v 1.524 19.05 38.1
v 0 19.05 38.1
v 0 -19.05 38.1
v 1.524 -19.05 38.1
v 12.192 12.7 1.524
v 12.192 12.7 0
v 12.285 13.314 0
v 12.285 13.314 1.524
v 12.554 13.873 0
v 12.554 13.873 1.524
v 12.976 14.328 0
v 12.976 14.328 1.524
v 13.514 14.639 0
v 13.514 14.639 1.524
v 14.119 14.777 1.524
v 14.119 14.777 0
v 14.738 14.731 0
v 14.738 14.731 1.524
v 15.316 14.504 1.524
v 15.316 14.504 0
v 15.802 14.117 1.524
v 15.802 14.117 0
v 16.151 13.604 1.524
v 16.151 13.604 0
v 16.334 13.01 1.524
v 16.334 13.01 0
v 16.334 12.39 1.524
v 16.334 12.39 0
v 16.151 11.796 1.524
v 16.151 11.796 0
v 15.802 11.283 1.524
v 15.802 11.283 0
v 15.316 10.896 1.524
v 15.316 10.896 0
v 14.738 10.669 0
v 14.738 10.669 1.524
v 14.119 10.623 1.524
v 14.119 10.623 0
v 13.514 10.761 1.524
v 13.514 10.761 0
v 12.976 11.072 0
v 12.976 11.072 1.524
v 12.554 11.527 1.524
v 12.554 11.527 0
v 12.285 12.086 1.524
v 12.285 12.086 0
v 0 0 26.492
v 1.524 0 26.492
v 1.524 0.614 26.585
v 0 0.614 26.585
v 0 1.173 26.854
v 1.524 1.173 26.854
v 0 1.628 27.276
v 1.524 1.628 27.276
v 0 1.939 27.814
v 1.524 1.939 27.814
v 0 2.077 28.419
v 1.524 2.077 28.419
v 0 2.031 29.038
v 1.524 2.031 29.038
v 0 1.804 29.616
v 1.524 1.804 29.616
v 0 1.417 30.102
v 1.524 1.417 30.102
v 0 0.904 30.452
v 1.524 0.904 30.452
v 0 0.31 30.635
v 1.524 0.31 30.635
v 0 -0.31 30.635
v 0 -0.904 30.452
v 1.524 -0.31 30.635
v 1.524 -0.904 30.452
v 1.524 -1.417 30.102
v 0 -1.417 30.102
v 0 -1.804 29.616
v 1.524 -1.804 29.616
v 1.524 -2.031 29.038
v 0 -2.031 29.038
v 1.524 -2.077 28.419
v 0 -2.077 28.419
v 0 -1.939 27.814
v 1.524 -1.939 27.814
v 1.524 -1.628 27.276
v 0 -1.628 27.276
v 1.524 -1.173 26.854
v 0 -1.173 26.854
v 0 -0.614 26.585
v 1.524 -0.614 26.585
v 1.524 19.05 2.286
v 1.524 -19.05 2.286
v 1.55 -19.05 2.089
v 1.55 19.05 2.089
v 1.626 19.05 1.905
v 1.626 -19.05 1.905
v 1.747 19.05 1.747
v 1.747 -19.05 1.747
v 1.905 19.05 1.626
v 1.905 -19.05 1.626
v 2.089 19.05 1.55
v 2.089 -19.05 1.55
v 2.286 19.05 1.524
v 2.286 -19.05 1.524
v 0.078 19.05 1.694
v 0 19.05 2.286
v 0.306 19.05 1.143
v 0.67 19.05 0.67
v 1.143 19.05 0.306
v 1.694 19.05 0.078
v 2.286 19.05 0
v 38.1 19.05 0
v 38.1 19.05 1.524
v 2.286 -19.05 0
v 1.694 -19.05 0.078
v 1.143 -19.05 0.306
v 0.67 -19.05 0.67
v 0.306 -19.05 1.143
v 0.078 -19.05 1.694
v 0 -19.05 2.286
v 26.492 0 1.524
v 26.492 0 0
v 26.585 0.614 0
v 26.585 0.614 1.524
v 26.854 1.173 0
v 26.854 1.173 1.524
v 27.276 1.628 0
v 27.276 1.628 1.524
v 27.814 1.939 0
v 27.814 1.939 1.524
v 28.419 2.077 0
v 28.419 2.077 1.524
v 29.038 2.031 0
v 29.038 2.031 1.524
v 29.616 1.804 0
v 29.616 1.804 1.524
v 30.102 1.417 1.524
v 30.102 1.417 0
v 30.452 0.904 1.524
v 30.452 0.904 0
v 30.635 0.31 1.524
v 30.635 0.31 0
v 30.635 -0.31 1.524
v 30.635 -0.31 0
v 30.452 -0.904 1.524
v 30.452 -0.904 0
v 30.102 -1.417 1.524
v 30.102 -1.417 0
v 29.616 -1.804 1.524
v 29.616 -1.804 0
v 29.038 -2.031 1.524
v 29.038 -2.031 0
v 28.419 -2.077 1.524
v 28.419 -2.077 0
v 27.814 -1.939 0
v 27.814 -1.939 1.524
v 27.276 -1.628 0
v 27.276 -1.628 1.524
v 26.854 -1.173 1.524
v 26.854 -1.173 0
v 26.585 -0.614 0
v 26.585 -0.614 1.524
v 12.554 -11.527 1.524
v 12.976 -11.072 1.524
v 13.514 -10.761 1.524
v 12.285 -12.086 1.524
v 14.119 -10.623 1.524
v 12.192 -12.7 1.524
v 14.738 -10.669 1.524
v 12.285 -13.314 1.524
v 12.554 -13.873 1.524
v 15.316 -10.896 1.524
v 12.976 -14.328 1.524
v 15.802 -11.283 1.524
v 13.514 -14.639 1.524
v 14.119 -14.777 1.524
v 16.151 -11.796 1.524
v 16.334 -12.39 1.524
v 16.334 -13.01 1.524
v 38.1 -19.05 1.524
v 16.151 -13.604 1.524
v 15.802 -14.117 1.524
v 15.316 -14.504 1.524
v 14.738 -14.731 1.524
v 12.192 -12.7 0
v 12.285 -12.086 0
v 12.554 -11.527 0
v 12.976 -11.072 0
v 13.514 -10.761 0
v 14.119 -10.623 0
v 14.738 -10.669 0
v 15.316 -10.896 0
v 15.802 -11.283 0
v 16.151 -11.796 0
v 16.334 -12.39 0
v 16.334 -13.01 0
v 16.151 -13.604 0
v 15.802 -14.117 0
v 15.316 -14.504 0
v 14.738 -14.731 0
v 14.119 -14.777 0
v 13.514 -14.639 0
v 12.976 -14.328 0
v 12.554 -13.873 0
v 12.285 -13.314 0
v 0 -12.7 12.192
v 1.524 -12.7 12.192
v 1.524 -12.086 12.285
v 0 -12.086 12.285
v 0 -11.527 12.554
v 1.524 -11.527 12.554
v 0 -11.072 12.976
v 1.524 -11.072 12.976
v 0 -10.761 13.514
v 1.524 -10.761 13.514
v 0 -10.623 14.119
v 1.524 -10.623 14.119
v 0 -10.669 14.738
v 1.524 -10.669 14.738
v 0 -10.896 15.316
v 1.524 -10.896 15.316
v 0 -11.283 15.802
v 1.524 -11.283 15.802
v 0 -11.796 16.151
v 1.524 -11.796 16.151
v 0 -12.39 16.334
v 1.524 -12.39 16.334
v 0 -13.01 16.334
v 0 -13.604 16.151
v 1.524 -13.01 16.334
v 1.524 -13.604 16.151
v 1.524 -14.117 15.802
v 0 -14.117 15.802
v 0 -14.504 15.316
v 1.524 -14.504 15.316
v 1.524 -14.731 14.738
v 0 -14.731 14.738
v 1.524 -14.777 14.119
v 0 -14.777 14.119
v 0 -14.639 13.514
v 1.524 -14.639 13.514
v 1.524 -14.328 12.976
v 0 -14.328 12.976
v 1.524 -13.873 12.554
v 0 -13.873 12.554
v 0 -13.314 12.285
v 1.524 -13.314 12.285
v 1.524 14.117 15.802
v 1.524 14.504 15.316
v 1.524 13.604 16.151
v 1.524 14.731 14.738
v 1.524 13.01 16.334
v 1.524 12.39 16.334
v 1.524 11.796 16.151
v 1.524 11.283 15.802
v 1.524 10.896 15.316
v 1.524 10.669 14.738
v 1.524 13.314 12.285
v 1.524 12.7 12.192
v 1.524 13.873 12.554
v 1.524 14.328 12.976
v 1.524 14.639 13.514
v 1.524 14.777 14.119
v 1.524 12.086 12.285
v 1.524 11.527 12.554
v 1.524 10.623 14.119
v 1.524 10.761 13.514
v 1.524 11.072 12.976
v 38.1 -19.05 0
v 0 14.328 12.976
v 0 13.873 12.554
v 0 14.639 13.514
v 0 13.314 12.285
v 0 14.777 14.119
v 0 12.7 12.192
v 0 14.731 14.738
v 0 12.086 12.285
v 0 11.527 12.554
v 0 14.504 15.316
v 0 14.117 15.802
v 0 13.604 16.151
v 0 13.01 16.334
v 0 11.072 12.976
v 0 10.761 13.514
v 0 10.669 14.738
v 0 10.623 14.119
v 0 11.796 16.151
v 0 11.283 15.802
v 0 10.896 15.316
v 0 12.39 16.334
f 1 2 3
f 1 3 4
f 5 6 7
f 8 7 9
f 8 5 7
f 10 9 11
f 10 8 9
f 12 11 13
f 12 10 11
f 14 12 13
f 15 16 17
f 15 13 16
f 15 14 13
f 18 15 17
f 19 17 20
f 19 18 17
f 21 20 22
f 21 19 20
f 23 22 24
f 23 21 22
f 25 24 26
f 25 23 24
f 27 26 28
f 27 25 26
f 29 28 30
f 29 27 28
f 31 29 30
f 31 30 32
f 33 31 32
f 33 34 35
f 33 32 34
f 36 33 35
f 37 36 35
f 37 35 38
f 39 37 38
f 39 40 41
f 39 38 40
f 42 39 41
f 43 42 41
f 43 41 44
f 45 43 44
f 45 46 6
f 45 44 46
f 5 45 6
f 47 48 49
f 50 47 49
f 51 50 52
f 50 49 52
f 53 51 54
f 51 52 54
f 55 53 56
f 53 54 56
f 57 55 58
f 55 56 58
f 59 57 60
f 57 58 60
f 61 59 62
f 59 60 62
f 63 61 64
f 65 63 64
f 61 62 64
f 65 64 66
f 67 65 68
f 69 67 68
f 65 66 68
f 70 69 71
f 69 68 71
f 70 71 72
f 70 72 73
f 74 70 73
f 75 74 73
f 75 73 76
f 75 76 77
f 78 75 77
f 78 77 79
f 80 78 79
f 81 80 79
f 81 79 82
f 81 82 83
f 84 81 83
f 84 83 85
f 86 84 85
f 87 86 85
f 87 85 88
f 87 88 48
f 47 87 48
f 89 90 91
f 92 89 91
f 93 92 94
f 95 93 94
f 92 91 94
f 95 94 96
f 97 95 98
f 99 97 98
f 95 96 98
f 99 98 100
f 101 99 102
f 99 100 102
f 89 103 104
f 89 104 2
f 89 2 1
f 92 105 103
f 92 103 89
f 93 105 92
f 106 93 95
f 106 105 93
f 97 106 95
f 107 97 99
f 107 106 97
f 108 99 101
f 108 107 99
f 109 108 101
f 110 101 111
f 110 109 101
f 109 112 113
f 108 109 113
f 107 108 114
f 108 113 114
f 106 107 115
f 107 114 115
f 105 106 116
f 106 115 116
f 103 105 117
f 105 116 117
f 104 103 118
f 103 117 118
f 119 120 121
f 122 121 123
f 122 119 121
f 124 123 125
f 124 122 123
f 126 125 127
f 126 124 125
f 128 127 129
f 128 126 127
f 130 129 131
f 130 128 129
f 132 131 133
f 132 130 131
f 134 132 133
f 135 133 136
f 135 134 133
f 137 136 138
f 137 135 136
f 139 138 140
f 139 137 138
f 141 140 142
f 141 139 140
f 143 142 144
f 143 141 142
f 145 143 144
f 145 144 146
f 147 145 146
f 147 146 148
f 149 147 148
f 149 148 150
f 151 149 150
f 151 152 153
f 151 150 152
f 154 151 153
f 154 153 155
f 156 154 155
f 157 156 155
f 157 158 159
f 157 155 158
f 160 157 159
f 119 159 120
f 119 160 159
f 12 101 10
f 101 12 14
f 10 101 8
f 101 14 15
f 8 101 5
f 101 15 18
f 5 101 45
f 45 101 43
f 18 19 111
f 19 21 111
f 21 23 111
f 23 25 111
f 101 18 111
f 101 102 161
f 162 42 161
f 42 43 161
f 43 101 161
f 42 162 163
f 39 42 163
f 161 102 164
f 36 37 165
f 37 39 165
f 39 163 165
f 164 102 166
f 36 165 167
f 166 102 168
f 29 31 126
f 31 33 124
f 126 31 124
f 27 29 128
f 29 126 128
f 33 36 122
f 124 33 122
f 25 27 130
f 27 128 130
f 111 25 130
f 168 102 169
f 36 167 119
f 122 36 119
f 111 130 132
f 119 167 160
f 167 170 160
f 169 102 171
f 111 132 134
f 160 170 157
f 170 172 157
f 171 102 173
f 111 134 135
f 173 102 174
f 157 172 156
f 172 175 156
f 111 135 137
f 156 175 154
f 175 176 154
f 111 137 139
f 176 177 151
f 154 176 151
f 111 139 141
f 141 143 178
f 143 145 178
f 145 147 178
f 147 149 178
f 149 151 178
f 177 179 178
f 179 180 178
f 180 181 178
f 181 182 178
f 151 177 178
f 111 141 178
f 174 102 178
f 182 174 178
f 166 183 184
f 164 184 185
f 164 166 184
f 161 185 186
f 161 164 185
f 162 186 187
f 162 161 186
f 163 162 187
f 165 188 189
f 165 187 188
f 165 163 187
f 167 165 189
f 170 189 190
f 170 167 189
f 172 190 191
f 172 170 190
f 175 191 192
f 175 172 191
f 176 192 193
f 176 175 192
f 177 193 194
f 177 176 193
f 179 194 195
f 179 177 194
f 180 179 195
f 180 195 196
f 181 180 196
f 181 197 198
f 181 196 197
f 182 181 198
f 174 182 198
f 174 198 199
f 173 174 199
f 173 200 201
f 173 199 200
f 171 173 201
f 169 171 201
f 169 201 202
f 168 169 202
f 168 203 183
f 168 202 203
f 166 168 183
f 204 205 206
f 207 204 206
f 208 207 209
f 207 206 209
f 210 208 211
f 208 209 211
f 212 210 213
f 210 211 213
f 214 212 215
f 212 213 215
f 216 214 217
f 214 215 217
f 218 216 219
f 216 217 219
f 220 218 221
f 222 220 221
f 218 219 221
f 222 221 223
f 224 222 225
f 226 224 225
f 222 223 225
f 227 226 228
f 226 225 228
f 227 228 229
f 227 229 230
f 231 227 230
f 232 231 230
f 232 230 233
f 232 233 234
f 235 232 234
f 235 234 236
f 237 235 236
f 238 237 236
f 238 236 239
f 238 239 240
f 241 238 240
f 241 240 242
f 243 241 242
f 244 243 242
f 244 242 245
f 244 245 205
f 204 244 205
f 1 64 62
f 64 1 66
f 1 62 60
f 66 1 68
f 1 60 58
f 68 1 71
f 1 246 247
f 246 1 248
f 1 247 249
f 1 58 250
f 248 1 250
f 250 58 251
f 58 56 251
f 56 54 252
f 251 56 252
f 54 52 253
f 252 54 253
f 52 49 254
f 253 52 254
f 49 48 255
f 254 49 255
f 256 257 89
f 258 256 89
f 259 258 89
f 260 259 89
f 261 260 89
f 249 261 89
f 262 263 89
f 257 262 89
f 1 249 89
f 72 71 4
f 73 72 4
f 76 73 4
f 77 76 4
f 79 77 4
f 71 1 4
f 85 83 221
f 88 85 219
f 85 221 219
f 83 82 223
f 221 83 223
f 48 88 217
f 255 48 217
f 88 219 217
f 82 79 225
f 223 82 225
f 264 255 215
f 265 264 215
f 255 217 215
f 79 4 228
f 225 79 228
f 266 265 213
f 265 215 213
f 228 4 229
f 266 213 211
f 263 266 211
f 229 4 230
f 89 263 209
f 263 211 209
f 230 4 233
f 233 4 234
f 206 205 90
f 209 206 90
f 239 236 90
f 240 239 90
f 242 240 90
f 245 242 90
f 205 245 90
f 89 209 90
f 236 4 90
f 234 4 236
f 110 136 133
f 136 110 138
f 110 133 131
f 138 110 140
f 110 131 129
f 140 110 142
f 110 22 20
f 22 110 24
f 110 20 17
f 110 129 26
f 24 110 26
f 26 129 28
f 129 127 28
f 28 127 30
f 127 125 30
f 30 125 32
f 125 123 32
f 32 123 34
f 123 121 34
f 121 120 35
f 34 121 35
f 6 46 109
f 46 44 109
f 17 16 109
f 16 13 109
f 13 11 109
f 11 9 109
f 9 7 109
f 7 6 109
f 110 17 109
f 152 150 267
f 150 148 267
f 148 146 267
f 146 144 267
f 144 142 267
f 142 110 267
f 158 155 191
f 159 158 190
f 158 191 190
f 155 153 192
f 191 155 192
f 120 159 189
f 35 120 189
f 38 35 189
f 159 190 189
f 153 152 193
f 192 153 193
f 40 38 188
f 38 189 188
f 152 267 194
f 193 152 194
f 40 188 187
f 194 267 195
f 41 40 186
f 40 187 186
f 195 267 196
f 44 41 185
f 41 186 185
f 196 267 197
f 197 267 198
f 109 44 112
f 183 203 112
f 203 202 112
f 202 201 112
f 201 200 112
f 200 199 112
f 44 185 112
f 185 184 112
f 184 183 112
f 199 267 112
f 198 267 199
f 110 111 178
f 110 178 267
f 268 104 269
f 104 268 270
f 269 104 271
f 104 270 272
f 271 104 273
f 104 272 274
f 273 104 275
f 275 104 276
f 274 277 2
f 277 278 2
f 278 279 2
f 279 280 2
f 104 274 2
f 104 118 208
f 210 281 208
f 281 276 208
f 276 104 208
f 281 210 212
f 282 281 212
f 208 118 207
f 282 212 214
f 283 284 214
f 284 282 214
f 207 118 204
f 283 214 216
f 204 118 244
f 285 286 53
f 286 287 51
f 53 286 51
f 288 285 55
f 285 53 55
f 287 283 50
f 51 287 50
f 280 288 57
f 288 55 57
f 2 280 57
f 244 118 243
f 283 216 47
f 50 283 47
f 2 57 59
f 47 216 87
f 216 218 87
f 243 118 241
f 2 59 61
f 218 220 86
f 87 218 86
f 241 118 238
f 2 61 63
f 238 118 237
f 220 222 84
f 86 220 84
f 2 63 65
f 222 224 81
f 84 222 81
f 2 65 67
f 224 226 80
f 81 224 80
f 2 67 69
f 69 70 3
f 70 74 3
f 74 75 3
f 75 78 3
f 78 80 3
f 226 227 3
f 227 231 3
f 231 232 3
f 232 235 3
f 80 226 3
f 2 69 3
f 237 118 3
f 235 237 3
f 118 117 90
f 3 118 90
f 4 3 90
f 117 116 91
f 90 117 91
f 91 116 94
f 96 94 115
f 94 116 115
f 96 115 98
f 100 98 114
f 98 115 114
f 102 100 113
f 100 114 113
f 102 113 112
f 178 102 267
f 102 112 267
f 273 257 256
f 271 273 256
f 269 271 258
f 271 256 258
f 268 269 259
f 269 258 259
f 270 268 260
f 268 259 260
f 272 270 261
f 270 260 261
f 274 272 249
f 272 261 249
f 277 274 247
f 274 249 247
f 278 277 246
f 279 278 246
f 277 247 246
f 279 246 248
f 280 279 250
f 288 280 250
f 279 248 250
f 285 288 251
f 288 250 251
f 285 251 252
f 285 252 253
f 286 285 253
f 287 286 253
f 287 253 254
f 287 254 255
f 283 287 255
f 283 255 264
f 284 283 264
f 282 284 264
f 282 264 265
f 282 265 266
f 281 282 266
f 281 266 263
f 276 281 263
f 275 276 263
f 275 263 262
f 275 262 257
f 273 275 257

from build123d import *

# Parameters (mm, degrees)
EXTRUDE_THIN1_START = -19.05
EXTRUDE_THIN1_DEPTH = 38.1
SKETCH4_R           = 2.0828
EXTRUDE3_DEPTH      = 57.145492036


# Read off the part's stored shape, not the designer's step: Extrude-Thin1
with BuildPart() as part:
    # Extrude-Thin1 outline → Extrude-Thin1 (new body)
    with BuildSketch(Plane(origin=(0, 0, 0), x_dir=(1, 0, 0), z_dir=(0, 1, 0)).offset(EXTRUDE_THIN1_START)):
        with BuildLine():
            Line((2.286, -1.524), (38.1, -1.524))
            Line((38.1, -1.524), (38.1, 0))
            Line((38.1, 0), (2.286, 0))
            ThreePointArc((2.286, 0), (0.669553898, -0.669553898), (0, -2.286))
            Line((0, -2.286), (0, -38.1))
            Line((0, -38.1), (1.524, -38.1))
            Line((1.524, -38.1), (1.524, -2.286))
            ThreePointArc((1.524, -2.286), (1.747184633, -1.747184633), (2.286, -1.524))
        make_face()
    extrude(amount=EXTRUDE_THIN1_DEPTH)

    # Sketch4 → Extrude3 (cut, through all)
    with BuildSketch(Plane(origin=(1.524, 0, 0), x_dir=(0, 0, -1), z_dir=(1, 0, 0))):
        with Locations((-28.575, 0)):
            Circle(SKETCH4_R)
        with Locations((-14.2748, 12.7)):
            Circle(SKETCH4_R)
        with Locations((-14.2748, -12.7)):
            Circle(SKETCH4_R)
    extrude3 = extrude(amount=-EXTRUDE3_DEPTH, mode=Mode.SUBTRACT)

    # Mirror1: Extrude3 across plane
    add(extrude3.mirror(Plane(origin=(0, 0, 0), x_dir=(0.7071067811865465, 0, 0.7071067811865486), z_dir=(-0.7071067811865488, 0, 0.7071067811865464))), mode=Mode.SUBTRACT)


solid = part.part
